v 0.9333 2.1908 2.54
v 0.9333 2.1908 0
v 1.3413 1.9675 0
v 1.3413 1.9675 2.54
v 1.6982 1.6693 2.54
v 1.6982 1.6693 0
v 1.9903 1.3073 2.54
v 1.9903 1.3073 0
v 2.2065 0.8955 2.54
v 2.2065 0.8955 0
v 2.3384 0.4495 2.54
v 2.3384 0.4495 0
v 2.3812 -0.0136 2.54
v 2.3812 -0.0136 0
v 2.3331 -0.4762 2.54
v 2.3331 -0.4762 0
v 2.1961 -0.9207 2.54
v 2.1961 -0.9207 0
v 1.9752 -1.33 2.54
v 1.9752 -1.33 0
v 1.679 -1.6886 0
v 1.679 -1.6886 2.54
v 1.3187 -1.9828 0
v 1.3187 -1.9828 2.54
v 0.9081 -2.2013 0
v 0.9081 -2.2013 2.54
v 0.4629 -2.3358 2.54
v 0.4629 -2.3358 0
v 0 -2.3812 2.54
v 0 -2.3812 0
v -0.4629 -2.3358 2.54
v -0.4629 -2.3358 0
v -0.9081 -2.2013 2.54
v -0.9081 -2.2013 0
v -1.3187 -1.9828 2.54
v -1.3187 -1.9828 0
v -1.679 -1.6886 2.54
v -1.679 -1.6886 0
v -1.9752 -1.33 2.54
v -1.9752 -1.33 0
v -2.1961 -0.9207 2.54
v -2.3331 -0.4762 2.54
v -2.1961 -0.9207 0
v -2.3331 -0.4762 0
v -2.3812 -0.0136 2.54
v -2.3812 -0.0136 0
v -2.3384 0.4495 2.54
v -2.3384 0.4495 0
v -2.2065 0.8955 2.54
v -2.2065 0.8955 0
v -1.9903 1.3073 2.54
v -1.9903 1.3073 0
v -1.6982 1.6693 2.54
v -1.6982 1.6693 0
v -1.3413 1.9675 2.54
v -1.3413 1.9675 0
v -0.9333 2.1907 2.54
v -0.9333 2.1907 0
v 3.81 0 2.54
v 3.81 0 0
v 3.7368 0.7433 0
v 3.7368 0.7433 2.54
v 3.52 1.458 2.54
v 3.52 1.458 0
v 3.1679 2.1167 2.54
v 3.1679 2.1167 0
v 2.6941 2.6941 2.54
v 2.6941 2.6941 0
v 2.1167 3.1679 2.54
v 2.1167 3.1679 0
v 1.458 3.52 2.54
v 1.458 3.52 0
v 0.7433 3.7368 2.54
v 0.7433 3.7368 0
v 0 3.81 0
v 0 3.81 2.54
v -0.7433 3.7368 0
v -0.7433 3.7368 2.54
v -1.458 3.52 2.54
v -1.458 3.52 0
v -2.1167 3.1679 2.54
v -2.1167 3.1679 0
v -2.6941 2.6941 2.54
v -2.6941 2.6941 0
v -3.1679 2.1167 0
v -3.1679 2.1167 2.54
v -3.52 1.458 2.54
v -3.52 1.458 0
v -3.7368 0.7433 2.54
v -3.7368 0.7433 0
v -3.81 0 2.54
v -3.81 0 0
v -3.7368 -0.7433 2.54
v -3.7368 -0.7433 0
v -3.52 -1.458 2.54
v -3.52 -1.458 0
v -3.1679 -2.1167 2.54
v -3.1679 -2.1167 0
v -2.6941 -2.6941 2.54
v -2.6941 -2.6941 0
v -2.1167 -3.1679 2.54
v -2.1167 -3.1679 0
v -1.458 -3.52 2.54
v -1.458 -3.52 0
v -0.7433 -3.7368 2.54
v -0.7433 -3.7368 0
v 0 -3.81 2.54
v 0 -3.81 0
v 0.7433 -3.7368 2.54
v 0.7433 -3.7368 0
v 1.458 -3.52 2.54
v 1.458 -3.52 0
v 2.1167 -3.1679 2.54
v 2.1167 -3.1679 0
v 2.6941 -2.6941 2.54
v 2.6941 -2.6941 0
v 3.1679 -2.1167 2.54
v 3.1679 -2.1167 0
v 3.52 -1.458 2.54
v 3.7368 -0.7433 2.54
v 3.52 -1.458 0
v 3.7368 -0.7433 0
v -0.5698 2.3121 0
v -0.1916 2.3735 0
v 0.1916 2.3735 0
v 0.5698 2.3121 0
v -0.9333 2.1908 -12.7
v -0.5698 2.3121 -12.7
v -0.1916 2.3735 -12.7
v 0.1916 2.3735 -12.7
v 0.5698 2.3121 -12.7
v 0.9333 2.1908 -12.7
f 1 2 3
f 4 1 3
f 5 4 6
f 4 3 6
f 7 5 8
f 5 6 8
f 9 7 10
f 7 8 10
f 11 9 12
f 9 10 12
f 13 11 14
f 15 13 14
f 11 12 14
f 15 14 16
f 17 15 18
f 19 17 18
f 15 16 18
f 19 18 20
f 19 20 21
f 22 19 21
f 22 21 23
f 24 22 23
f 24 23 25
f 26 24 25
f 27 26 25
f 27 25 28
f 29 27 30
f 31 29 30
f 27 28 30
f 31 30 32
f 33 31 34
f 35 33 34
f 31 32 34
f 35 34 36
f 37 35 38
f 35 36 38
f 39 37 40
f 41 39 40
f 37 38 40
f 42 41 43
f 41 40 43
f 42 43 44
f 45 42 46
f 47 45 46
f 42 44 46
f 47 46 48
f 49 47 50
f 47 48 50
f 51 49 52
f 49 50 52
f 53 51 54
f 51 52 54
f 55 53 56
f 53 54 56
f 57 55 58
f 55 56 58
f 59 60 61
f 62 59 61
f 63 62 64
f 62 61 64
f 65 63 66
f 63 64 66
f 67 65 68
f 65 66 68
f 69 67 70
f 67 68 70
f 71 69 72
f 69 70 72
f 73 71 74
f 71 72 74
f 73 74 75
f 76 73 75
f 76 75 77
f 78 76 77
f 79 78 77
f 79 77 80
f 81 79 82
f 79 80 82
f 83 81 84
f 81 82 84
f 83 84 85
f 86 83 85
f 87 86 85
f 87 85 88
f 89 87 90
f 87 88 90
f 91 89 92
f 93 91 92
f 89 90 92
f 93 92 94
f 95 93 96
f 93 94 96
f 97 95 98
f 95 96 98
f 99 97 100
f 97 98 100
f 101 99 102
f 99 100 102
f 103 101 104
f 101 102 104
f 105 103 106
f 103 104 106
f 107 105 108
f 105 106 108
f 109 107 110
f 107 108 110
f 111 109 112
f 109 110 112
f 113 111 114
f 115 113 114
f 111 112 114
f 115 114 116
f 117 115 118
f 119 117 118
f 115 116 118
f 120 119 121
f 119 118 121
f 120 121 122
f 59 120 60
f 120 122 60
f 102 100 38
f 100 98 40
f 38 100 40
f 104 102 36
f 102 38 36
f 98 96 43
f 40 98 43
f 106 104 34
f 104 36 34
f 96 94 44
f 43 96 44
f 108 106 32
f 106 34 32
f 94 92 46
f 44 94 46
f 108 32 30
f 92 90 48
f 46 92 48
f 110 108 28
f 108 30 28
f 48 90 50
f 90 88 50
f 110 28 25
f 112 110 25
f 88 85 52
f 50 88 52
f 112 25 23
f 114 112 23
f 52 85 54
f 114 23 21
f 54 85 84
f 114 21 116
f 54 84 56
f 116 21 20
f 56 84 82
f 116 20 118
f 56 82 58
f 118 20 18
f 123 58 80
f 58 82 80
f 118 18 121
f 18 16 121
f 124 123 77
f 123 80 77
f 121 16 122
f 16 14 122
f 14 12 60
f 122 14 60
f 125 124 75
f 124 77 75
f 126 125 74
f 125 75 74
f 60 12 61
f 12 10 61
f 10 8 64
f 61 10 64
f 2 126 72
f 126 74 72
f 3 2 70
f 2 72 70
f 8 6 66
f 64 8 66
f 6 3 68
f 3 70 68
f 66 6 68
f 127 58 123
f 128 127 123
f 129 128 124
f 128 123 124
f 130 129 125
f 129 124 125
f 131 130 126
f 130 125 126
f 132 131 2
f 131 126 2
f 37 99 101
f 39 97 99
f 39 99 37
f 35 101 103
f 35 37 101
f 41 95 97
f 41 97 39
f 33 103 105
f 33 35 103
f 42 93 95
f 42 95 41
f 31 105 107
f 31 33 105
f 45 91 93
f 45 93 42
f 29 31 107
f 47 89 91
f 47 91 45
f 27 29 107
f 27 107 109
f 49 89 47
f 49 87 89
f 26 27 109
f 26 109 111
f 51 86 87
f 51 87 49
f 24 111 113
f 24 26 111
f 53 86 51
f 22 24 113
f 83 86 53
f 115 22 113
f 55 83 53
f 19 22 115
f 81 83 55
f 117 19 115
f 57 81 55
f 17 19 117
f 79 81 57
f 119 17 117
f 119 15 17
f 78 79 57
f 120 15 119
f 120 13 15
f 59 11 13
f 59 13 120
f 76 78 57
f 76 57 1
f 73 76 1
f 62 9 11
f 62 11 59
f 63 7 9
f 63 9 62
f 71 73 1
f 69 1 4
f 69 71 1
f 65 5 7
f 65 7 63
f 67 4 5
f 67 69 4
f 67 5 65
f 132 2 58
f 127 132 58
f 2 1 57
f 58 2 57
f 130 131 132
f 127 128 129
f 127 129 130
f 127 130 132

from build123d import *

# Parameters (mm, degrees)
SKETCH1_R           = 3.81
BOSS_EXTRUDE1_DEPTH = 2.54
BOSS_EXTRUDE2_DEPTH = 12.7


with BuildPart() as part:
    # Sketch1 → Boss-Extrude1 (new body)
    with BuildSketch(Plane.XY):
        Circle(SKETCH1_R)
        with BuildLine():
            Line((-0.933255592, 2.19075), (0.933255592, 2.19075))
            ThreePointArc((0.933255592, 2.19075), (0, -2.38125), (-0.933255592, 2.19075))
        make_face(mode=Mode.SUBTRACT)
    extrude(amount=BOSS_EXTRUDE1_DEPTH)

    # Sketch2 → Boss-Extrude2 (add)
    with BuildSketch(Plane(origin=(0, 0, 0), x_dir=(-1, 0, 0), z_dir=(0, 0, -1))):
        with BuildLine():
            Line((-0.933255592, 2.19075), (0.933255592, 2.19075))
            ThreePointArc((0.933255592, 2.19075), (0, 2.38125), (-0.933255592, 2.19075))
        make_face()
    extrude(amount=BOSS_EXTRUDE2_DEPTH)


solid = part.part
